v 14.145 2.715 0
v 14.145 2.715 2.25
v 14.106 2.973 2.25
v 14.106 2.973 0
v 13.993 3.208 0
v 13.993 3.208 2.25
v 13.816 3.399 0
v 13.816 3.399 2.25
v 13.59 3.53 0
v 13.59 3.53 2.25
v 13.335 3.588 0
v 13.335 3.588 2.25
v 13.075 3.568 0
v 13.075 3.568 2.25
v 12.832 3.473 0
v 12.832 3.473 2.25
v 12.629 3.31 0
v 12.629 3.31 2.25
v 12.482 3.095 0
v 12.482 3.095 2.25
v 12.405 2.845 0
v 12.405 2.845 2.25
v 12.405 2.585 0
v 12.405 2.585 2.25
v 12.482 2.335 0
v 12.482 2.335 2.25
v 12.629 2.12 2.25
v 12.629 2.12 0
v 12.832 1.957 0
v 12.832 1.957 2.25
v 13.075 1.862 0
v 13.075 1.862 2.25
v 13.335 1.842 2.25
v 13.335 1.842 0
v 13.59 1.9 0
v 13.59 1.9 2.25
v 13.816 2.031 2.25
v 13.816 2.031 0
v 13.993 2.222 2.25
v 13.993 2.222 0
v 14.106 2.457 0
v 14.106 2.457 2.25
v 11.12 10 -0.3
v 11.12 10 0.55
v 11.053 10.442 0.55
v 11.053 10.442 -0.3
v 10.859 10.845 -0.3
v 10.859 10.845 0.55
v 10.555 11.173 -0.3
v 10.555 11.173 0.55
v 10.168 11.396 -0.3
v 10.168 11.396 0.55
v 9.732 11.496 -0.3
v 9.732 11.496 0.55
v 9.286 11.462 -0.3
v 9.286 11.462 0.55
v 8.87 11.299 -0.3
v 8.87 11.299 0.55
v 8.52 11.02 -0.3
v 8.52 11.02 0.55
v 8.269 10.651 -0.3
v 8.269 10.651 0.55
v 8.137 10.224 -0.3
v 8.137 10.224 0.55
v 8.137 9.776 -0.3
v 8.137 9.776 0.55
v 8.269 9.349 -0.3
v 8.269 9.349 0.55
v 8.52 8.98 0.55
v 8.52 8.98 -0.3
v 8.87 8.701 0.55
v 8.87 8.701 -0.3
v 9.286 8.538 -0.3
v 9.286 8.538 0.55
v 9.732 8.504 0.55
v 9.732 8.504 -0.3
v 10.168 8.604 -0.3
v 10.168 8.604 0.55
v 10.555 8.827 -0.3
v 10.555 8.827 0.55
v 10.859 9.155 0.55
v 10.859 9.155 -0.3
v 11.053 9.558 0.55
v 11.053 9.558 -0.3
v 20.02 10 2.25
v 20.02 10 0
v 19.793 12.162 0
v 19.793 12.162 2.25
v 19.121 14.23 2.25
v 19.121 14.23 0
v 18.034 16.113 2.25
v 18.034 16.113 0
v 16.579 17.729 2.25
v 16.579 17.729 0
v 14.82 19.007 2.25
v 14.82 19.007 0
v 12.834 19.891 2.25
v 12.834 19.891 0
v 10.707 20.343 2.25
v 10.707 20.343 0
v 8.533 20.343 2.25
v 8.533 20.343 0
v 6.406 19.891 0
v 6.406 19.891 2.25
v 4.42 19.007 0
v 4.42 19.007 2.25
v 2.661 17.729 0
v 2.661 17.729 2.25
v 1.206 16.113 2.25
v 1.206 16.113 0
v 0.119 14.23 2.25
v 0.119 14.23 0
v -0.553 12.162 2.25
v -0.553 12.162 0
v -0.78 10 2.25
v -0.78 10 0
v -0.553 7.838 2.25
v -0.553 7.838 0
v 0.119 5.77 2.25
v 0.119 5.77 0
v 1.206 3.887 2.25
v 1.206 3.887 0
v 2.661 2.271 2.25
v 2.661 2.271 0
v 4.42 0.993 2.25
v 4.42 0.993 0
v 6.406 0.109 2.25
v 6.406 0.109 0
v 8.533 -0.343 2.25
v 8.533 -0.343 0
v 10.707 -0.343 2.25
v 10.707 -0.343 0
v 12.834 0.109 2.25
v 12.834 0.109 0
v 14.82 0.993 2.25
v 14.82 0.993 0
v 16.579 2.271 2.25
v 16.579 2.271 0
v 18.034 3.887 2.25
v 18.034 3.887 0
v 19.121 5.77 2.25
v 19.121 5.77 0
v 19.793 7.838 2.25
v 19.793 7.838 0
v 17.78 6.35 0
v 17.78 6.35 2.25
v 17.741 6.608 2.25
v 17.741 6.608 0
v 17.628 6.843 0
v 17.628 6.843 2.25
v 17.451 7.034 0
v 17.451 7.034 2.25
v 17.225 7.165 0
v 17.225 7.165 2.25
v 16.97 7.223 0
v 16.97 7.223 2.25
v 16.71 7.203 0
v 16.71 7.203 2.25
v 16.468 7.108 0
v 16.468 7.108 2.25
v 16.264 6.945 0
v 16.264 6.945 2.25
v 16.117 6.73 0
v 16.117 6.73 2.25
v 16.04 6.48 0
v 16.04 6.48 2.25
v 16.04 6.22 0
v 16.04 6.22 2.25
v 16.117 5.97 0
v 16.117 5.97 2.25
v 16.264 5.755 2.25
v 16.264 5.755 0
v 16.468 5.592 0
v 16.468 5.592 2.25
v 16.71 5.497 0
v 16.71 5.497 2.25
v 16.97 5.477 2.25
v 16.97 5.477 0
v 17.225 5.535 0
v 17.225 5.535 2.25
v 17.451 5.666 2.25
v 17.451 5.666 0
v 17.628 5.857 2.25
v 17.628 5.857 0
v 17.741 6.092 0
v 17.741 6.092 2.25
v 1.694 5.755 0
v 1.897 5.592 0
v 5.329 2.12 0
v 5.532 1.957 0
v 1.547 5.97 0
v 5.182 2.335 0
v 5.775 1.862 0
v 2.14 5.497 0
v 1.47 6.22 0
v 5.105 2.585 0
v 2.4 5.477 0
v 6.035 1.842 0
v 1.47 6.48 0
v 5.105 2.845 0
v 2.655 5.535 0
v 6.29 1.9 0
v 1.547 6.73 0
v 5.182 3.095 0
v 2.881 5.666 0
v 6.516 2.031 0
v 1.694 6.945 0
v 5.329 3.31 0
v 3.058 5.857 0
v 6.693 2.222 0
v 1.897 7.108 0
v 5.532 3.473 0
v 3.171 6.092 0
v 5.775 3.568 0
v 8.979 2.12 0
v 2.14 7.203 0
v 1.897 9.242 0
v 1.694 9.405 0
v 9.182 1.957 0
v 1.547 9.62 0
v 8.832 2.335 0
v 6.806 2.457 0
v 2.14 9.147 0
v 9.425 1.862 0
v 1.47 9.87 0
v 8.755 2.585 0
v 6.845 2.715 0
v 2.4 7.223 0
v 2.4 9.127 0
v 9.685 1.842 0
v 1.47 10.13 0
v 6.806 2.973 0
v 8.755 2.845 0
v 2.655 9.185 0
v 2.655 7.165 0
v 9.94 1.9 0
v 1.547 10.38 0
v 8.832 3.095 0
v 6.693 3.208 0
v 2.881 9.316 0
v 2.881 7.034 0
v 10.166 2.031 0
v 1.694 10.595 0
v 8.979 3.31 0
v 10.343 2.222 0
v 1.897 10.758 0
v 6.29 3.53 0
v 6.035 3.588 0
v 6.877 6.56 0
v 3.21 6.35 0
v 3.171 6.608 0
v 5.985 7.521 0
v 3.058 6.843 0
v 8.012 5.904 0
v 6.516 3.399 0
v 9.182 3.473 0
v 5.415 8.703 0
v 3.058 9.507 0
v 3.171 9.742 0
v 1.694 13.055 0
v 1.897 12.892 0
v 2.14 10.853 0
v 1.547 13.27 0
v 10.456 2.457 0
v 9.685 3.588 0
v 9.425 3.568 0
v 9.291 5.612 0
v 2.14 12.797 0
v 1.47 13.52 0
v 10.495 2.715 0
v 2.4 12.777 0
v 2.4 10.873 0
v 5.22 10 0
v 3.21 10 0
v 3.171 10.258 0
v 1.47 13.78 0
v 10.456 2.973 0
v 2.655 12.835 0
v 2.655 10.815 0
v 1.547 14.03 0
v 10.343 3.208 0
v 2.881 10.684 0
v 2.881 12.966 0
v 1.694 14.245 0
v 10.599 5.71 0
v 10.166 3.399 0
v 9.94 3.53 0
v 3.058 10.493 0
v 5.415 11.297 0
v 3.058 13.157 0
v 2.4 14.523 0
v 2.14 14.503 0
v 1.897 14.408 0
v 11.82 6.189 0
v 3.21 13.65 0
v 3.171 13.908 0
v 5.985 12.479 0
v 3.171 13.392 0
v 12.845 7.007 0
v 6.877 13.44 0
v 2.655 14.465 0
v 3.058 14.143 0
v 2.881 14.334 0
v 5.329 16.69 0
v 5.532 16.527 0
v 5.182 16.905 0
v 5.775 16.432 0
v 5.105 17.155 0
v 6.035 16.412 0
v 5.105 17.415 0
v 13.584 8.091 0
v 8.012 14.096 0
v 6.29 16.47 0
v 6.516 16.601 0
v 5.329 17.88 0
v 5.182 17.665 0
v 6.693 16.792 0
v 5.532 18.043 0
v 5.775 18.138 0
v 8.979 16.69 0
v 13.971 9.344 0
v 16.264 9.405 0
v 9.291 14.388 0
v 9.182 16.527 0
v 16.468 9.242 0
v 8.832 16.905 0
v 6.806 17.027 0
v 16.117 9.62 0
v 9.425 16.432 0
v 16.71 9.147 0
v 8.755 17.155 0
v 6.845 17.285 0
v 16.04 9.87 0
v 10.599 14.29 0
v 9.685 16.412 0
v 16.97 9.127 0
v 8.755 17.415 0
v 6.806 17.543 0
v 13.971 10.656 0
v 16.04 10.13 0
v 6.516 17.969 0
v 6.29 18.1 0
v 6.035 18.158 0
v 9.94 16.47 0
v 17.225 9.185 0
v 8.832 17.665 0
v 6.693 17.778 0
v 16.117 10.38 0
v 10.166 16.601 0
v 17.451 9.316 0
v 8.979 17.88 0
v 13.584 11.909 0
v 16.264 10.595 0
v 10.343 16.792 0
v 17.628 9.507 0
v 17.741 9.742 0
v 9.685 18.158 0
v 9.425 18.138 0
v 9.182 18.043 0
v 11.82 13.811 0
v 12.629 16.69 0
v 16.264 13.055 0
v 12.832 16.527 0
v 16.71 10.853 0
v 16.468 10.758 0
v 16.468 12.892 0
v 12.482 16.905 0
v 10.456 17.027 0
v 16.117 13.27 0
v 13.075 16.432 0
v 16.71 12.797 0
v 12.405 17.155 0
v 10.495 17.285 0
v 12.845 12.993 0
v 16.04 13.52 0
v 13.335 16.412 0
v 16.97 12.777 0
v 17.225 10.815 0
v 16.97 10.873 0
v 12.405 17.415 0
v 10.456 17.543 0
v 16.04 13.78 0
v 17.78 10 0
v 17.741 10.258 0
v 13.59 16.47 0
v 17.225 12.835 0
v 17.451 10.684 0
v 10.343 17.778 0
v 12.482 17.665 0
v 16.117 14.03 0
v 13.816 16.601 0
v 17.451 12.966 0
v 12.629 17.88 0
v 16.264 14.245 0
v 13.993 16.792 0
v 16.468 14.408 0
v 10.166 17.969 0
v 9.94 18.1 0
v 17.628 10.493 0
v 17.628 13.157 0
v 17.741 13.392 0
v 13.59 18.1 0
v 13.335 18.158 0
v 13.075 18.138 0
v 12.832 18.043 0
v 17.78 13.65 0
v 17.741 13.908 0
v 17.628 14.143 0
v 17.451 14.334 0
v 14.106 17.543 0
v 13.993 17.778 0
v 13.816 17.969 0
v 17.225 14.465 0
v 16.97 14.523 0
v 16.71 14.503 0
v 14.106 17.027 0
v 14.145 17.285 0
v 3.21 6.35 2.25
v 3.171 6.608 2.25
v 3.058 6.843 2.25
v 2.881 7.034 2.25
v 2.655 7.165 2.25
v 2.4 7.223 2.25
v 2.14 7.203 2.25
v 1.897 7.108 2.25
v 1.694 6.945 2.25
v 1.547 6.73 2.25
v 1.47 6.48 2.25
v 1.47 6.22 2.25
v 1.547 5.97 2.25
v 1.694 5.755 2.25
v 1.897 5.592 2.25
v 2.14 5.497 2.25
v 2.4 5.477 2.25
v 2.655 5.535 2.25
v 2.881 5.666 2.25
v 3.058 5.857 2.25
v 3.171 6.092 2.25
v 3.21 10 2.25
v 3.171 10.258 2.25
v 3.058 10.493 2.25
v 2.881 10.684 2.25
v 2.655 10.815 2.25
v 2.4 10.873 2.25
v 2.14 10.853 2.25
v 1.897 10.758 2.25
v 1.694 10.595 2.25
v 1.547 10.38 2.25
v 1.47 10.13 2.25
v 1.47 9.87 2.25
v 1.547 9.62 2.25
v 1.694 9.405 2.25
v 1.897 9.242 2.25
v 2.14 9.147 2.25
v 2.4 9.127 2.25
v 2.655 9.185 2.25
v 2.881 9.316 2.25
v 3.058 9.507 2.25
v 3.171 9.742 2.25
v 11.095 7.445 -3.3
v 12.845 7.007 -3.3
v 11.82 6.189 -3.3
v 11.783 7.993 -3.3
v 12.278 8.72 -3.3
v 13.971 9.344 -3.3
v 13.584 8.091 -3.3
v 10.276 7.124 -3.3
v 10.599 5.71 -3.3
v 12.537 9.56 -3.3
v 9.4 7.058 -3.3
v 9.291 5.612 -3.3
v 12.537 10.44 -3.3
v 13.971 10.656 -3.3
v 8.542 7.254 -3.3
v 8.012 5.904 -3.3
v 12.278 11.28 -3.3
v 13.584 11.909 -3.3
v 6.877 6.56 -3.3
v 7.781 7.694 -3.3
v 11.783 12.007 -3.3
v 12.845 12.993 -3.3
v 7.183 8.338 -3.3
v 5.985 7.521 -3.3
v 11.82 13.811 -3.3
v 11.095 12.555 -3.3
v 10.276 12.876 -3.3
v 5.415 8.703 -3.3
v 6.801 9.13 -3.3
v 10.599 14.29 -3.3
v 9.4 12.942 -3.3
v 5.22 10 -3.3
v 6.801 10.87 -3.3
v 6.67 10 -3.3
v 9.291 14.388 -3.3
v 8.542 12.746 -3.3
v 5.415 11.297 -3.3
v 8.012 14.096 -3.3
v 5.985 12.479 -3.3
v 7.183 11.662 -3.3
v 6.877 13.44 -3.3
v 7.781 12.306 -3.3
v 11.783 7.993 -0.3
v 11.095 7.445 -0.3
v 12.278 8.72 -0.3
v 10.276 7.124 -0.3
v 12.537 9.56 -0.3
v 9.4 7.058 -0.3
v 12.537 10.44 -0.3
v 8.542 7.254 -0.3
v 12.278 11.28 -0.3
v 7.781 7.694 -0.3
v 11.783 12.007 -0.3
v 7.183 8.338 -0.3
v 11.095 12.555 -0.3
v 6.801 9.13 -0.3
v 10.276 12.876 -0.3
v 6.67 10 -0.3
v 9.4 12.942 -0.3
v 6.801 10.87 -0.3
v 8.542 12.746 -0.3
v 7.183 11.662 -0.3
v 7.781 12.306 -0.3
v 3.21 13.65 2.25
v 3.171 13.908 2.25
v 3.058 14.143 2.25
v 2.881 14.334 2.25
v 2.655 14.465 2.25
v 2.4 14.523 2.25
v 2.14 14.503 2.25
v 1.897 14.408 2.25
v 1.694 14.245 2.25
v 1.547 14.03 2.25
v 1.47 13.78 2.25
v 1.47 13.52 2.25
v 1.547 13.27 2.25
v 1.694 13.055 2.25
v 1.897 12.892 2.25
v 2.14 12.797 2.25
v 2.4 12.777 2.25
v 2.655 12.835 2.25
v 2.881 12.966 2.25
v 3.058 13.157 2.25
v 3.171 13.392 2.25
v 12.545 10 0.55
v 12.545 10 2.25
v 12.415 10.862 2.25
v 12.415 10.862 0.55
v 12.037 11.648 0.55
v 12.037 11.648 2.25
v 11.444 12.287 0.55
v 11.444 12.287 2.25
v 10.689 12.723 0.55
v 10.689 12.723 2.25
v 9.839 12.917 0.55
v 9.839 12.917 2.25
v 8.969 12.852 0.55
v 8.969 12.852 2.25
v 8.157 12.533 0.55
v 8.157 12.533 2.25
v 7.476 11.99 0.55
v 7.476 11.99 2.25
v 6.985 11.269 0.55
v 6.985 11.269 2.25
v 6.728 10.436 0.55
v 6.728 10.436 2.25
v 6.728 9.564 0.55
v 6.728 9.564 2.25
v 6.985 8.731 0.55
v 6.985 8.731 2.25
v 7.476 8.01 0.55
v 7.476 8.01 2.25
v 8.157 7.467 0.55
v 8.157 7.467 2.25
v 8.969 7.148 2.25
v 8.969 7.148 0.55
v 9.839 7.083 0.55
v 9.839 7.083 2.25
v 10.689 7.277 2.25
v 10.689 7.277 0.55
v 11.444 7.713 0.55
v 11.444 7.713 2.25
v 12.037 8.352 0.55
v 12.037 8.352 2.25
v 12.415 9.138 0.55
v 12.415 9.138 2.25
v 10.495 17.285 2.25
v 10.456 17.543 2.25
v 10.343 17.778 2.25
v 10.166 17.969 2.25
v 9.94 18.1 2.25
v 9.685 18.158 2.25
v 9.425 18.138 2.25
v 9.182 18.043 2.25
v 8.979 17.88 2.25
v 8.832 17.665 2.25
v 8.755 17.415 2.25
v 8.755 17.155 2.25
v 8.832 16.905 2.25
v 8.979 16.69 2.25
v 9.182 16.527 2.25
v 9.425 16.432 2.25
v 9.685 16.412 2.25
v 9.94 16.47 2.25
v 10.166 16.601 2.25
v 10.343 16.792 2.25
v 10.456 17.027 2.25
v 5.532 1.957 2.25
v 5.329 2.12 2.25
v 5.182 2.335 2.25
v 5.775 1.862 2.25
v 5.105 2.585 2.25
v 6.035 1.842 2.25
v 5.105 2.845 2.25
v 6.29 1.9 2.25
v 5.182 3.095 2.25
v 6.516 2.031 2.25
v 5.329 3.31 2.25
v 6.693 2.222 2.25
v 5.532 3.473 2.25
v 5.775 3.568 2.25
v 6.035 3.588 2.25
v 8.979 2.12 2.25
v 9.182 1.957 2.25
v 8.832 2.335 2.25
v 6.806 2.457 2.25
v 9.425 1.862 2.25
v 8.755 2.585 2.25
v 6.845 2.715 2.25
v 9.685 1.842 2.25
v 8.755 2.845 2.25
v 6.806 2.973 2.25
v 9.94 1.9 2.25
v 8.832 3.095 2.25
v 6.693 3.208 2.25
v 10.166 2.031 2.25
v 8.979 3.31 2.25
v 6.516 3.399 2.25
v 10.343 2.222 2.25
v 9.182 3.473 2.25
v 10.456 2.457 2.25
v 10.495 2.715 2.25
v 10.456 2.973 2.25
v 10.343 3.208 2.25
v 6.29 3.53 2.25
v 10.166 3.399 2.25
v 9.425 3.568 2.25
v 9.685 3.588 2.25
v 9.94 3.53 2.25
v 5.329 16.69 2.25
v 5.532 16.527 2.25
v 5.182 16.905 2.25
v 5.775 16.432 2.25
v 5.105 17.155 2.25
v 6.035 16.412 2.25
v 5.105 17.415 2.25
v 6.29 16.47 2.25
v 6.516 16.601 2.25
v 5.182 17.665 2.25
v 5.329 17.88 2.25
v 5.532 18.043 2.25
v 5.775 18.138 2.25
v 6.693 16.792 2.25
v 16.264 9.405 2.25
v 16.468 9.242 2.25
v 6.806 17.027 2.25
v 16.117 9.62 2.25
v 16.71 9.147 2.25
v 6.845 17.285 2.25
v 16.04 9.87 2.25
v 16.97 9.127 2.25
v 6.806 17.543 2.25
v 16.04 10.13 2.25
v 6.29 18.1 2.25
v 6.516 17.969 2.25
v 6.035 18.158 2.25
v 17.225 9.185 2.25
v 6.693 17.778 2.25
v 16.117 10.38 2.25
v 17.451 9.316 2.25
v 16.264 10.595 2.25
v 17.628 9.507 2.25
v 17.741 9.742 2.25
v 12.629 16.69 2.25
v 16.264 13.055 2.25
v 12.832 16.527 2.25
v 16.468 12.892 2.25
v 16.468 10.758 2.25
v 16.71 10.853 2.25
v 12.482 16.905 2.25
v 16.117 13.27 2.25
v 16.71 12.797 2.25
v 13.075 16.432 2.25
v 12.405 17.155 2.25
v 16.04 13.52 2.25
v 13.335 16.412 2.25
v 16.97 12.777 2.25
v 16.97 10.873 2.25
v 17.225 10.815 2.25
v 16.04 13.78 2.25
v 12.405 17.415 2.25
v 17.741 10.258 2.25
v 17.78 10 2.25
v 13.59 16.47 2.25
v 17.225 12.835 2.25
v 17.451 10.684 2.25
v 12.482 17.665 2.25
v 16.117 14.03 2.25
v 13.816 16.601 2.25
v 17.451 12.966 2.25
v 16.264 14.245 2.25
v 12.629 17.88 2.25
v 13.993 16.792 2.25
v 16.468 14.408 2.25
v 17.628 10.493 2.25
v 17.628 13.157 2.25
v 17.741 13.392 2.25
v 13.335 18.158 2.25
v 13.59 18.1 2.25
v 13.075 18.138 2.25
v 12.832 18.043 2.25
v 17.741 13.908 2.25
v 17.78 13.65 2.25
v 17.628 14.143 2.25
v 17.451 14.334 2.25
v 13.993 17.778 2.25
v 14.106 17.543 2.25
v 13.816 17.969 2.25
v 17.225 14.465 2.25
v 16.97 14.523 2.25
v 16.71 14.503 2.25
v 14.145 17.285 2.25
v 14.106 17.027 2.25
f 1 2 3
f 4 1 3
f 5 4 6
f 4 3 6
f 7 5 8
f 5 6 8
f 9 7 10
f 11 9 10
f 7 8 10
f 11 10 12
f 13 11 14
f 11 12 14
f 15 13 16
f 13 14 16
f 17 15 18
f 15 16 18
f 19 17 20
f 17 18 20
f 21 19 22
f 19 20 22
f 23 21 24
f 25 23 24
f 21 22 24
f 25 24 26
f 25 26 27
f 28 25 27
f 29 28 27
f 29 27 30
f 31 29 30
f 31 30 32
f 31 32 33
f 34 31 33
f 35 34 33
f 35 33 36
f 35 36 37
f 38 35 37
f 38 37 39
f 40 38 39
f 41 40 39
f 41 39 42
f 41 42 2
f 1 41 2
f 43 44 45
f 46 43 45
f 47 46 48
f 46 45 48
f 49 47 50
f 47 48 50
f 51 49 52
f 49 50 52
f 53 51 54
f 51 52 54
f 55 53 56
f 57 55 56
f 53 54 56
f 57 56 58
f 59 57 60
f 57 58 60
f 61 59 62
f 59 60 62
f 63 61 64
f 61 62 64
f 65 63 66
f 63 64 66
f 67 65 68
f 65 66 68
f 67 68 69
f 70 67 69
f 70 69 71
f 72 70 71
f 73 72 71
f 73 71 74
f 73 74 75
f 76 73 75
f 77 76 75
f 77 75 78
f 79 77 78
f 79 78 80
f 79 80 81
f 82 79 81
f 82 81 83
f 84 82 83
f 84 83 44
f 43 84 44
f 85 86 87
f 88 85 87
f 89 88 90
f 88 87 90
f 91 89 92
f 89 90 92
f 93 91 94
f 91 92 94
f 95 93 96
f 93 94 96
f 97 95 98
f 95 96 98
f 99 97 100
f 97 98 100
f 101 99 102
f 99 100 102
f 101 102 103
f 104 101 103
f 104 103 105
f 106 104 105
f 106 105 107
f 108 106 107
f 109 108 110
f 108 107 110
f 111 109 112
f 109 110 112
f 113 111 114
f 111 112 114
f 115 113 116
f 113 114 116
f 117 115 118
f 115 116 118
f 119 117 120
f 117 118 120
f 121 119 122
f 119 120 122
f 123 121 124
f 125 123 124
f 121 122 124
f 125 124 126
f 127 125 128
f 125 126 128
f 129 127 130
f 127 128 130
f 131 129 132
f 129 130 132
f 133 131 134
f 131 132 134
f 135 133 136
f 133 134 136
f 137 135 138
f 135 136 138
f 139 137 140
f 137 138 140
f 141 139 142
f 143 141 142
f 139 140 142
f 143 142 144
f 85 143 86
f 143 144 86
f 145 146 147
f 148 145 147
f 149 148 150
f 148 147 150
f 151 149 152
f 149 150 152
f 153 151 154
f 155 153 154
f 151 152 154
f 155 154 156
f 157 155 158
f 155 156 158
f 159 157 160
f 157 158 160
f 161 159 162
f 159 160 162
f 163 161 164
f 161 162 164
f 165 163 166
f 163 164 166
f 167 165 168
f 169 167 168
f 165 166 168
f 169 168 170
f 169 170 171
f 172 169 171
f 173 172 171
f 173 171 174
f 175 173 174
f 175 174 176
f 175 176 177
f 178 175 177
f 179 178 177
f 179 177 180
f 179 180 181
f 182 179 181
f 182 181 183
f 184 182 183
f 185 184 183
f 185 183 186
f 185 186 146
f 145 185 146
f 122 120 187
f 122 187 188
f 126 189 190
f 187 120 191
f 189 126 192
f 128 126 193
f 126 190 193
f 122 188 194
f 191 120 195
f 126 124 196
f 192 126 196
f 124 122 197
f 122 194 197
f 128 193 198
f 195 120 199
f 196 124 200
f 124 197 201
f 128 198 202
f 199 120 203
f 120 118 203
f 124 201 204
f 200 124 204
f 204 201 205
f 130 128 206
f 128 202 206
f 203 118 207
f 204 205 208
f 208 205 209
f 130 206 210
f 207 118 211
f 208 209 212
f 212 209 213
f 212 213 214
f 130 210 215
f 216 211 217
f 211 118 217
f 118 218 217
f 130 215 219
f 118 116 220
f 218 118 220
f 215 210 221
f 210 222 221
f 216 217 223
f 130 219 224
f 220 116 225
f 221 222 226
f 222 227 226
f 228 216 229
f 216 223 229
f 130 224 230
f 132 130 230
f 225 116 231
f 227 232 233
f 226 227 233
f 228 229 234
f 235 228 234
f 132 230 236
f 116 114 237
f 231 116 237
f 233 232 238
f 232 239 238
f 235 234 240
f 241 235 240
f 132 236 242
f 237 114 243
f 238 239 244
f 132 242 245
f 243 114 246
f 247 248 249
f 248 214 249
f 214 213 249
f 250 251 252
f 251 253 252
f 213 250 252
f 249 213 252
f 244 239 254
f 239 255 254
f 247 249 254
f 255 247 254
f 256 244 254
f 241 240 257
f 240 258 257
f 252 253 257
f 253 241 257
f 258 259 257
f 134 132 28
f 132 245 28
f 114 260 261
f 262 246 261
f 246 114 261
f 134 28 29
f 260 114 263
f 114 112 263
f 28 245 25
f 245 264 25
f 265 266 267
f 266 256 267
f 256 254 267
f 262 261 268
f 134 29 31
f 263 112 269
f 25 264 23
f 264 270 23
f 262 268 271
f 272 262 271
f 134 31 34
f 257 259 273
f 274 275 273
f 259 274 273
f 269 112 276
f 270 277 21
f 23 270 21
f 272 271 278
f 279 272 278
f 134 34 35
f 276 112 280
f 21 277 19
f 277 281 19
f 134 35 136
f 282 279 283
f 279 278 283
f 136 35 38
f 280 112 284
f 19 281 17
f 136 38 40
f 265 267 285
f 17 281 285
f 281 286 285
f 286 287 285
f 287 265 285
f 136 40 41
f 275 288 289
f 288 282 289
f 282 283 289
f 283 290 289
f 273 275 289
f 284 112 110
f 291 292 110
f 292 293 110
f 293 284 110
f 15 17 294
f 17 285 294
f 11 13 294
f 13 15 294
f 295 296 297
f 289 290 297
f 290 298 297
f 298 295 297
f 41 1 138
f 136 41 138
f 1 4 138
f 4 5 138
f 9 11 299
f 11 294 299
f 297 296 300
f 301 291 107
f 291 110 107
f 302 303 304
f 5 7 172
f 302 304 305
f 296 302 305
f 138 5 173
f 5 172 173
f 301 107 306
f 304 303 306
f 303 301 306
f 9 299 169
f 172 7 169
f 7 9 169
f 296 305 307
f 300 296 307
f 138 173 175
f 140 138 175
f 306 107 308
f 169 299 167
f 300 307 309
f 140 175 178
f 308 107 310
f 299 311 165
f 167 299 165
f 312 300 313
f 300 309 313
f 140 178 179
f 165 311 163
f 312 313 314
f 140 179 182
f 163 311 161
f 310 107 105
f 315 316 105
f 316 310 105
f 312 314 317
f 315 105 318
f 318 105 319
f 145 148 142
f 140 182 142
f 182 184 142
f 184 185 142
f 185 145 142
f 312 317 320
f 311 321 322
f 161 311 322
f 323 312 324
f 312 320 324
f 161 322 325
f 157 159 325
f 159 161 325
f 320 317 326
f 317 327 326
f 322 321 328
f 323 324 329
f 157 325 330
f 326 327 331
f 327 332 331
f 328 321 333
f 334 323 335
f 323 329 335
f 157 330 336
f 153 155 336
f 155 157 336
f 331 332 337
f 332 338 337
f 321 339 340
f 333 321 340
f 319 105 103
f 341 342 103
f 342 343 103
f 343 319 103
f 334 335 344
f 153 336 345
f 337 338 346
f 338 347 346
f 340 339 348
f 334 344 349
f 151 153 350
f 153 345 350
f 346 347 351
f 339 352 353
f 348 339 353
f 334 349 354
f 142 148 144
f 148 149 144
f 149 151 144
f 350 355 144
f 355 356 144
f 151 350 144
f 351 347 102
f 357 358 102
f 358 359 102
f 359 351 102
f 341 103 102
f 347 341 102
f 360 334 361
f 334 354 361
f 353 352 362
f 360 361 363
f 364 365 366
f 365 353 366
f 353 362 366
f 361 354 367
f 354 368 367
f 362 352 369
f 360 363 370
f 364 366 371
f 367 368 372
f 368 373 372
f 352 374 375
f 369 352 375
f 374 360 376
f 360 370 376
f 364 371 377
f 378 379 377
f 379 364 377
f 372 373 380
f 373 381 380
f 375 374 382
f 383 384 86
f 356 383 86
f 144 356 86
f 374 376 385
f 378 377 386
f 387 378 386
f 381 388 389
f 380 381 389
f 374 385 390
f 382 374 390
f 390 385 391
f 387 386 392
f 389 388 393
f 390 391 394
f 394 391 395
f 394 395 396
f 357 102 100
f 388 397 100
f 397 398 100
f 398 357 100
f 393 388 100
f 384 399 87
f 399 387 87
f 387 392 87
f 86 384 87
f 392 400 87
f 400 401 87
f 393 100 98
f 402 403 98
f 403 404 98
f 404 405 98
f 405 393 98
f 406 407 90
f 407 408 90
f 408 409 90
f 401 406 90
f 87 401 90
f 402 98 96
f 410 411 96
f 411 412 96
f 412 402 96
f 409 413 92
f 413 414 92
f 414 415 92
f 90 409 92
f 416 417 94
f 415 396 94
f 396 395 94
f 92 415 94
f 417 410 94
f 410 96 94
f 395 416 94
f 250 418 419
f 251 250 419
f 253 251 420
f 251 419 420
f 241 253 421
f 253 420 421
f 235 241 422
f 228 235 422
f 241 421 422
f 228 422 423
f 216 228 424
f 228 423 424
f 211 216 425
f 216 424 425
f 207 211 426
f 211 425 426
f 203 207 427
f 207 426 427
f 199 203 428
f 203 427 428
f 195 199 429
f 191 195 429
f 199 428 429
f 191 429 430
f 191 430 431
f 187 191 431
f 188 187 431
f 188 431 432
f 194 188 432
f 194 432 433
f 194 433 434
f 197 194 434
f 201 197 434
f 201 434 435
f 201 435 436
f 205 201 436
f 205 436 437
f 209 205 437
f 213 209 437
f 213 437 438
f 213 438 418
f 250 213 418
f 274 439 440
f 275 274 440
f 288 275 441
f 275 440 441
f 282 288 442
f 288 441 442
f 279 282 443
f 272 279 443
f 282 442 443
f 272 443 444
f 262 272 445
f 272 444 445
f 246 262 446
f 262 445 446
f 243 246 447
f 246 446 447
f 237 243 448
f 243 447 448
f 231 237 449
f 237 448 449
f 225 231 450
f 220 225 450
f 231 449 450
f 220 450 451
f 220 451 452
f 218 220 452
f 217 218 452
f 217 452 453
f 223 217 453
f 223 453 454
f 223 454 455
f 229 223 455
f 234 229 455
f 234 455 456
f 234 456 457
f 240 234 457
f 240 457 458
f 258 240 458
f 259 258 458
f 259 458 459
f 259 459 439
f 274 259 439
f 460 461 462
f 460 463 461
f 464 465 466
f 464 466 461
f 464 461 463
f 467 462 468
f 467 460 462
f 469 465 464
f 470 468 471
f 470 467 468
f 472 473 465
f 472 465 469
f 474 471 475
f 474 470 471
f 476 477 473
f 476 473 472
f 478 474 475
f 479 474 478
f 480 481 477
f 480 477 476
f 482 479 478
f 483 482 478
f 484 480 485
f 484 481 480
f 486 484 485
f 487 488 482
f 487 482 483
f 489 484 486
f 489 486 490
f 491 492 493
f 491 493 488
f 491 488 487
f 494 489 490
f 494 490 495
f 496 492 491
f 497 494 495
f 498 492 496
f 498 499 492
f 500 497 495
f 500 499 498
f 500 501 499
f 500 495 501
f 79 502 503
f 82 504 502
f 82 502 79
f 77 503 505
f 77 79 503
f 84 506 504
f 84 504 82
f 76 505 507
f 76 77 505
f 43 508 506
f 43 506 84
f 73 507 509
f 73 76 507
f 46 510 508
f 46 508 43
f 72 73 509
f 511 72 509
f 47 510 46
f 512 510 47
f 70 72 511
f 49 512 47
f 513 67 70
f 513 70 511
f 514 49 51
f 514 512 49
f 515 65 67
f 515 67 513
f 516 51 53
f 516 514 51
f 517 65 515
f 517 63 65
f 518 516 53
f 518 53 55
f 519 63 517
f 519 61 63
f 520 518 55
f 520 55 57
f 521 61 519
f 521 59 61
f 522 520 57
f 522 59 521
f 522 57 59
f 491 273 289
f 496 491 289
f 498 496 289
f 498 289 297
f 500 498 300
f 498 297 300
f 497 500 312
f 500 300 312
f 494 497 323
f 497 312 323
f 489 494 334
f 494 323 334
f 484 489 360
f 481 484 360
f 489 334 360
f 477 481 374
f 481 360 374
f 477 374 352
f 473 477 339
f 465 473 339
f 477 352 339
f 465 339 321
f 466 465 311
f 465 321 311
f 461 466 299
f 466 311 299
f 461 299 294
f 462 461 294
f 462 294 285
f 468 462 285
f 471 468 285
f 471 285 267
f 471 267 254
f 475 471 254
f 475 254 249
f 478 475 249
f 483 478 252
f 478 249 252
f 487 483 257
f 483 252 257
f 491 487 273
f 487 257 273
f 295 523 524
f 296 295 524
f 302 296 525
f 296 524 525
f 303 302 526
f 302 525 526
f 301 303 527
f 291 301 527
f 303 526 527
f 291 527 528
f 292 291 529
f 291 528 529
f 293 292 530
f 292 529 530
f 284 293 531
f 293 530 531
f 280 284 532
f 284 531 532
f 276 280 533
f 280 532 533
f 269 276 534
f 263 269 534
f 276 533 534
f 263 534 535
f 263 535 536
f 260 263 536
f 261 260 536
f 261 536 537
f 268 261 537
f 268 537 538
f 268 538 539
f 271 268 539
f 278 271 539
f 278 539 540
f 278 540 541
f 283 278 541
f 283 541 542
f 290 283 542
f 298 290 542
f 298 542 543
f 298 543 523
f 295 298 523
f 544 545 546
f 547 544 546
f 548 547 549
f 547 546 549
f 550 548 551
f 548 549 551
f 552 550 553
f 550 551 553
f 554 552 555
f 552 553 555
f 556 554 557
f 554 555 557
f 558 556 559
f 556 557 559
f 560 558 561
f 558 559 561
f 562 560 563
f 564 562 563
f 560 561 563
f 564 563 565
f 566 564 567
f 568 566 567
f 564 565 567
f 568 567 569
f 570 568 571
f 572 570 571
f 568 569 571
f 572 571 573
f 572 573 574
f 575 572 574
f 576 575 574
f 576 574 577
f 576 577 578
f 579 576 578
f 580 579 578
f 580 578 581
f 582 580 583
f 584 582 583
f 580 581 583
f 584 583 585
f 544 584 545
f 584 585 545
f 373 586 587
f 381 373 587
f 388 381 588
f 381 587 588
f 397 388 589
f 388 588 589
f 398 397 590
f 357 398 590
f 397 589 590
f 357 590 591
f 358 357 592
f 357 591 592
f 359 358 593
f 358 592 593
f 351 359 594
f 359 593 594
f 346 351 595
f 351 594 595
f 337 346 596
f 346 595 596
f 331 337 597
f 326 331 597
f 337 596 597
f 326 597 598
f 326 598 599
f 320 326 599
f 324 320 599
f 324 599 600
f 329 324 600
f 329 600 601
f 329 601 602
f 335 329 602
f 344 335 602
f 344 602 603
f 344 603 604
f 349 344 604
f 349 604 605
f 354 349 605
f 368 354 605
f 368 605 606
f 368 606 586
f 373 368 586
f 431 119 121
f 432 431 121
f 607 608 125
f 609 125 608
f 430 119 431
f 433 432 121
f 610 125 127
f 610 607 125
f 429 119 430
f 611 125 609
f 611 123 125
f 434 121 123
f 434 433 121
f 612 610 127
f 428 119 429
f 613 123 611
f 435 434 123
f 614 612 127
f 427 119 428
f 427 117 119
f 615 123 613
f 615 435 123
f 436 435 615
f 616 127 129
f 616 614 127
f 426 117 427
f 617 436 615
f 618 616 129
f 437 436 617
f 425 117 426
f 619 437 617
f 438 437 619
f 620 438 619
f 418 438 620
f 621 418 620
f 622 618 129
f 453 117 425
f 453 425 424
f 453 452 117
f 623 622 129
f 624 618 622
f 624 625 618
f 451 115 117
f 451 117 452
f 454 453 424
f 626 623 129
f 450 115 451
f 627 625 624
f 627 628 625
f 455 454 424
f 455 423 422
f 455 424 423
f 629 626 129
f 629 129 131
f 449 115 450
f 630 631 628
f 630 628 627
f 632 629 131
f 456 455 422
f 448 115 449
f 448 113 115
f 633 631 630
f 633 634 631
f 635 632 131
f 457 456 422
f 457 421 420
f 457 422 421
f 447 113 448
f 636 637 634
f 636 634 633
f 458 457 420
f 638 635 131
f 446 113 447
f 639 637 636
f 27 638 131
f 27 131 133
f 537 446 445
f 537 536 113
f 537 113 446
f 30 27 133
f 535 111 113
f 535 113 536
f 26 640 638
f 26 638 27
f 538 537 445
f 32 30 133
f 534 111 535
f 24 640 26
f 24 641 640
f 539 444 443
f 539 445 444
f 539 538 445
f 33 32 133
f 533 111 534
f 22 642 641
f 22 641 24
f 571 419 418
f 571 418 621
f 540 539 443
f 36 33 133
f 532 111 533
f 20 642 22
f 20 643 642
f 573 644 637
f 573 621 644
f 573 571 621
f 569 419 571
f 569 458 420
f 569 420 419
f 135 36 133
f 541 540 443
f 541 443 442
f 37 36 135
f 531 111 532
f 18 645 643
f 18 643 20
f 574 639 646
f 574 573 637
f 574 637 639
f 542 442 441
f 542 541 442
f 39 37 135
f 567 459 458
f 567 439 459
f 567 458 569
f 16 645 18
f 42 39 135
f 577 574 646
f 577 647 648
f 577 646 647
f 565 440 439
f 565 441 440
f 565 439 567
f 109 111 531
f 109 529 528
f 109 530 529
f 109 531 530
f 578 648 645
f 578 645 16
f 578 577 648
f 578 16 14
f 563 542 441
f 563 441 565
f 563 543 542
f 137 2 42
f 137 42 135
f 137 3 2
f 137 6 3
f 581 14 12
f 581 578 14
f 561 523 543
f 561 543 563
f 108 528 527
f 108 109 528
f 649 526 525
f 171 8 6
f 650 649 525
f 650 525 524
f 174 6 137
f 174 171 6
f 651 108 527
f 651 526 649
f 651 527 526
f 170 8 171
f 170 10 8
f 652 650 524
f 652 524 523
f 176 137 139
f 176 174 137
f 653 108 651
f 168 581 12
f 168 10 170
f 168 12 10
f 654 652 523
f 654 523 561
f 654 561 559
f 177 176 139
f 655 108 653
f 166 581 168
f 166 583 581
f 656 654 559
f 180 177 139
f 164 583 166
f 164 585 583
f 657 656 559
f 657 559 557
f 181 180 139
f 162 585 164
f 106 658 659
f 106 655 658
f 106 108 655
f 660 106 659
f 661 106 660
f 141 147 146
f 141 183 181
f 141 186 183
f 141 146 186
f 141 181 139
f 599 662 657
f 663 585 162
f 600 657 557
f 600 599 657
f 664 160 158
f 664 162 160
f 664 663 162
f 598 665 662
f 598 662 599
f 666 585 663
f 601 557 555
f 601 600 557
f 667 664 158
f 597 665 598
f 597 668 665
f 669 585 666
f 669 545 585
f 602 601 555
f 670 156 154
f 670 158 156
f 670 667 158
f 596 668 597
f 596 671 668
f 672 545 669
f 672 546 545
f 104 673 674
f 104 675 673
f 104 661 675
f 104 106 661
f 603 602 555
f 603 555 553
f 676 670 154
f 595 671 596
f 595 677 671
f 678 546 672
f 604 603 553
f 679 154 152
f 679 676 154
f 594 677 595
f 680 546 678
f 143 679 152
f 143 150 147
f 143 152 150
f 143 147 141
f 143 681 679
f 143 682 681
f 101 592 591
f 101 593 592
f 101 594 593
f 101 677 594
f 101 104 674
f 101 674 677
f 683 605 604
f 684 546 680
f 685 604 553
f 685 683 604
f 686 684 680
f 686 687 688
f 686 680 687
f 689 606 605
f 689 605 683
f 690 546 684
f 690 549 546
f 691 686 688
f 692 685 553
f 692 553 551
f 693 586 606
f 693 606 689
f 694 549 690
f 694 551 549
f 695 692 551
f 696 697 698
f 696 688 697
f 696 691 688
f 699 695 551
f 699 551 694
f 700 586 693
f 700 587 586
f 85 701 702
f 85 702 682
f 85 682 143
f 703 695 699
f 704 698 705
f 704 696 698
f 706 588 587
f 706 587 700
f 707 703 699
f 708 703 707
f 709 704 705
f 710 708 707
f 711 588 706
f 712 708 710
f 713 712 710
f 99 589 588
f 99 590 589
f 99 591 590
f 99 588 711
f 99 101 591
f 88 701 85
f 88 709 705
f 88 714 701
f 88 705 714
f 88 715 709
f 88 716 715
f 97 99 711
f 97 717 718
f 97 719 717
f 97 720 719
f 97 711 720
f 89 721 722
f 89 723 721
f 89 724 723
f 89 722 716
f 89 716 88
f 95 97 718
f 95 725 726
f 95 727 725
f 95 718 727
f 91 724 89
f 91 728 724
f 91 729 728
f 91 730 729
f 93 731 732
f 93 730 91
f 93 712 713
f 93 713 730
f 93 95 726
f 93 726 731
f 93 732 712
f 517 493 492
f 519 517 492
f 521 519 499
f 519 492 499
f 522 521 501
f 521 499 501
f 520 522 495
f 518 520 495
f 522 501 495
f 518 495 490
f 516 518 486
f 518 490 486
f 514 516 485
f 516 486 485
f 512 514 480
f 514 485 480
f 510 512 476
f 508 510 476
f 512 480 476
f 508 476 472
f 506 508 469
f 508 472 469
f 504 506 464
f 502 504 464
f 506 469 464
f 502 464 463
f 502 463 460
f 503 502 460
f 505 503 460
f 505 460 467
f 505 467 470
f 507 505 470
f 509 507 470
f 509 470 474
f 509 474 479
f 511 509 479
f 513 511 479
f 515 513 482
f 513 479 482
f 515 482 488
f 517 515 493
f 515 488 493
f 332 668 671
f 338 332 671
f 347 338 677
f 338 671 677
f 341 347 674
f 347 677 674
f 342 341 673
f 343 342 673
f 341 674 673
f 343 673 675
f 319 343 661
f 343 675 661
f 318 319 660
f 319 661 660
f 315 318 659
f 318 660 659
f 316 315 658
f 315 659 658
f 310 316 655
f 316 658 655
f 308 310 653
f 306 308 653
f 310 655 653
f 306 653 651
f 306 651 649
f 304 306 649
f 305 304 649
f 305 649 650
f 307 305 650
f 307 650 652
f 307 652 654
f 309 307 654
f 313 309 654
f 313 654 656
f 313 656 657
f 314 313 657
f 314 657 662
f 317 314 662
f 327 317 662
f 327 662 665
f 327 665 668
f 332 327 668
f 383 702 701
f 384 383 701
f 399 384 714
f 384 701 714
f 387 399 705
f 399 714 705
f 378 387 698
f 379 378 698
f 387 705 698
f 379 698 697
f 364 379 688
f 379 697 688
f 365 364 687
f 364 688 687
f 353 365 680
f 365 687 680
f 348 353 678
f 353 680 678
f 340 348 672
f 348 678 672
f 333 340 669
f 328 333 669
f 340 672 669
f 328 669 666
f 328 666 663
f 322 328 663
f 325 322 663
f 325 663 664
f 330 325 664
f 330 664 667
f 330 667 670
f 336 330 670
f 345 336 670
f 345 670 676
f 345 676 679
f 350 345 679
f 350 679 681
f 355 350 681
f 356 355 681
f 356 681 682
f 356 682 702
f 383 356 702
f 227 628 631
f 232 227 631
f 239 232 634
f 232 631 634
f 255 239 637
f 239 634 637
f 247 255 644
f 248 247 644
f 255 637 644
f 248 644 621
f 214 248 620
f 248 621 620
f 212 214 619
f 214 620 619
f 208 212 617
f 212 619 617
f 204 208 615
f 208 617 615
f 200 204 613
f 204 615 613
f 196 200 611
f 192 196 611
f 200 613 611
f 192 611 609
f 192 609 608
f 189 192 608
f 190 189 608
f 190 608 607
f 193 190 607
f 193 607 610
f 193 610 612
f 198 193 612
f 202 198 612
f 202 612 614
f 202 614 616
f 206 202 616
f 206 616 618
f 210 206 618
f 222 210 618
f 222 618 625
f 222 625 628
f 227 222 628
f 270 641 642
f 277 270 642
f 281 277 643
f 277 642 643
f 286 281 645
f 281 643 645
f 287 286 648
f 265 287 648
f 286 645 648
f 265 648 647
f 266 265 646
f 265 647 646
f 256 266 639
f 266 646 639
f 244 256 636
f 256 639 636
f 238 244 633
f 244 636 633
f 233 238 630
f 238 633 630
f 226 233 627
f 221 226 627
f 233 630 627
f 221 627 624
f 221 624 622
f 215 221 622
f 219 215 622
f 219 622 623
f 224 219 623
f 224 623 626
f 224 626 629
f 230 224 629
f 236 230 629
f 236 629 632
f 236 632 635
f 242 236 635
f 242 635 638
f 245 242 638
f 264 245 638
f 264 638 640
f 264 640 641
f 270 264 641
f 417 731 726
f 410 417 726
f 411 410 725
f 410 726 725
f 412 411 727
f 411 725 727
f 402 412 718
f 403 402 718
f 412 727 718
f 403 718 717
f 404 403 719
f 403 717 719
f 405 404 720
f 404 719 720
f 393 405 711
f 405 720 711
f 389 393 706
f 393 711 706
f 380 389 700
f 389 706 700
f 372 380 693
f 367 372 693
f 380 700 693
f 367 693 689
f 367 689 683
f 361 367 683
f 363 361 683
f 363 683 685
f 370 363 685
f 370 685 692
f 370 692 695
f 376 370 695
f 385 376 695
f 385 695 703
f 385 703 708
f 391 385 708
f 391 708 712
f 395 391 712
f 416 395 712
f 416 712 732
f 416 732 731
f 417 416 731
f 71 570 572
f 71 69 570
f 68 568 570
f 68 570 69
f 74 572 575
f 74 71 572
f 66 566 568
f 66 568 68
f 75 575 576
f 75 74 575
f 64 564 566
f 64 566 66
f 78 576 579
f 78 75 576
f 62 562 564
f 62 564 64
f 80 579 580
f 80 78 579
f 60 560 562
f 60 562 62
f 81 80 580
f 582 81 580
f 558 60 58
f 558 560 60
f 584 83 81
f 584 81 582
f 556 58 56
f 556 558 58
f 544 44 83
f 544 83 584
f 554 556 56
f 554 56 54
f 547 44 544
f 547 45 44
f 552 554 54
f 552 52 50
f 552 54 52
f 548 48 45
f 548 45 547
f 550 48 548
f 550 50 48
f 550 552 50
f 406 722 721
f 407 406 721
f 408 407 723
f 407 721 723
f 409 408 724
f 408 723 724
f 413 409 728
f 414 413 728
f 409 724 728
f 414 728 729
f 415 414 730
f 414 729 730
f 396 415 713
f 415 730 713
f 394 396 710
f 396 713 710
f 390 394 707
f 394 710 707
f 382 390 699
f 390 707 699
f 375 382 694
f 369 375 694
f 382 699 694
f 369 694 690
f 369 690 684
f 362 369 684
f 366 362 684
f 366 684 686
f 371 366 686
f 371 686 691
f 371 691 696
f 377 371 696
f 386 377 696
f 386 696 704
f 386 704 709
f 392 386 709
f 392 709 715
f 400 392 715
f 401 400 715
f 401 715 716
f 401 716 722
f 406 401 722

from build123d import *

# Parameters (mm, degrees)
SKETCH1_R           = 10.4
BOSS_EXTRUDE1_DEPTH = 2.25
SKETCH2_R           = 4.4
BOSS_EXTRUDE2_DEPTH = 3.3
SKETCH3_R           = 1.5
SKETCH3_R_2         = 0.875
CUT_EXTRUDE1_DEPTH  = 5.55
SKETCH4_R           = 2.925
CUT_EXTRUDE2_DEPTH  = 1.7
SKETCH5_R           = 2.95
CUT_EXTRUDE3_DEPTH  = 3


with BuildPart() as part:
    # Sketch1 → Boss-Extrude1 (new body)
    with BuildSketch(Plane.XY):
        with Locations((9.62, 10)):
            Circle(SKETCH1_R)
    extrude(amount=BOSS_EXTRUDE1_DEPTH)

    # Sketch2 → Boss-Extrude2 (add)
    with BuildSketch(Plane(origin=(0, 0, 0), x_dir=(-1, 0, 0), z_dir=(0, 0, -1))):
        with Locations((-9.62, 10)):
            Circle(SKETCH2_R)
    extrude(amount=BOSS_EXTRUDE2_DEPTH)

    # Sketch3 → Cut-Extrude1 (cut)
    with BuildSketch(Plane.XY.offset(2.25)):
        with Locations((9.62, 10)):
            Circle(SKETCH3_R)
        with Locations((9.62, 2.715)):
            Circle(SKETCH3_R_2)
        with Locations((5.97, 2.715)):
            Circle(SKETCH3_R_2)
        with Locations((13.27, 2.715)):
            Circle(SKETCH3_R_2)
        with Locations((2.335, 6.35)):
            Circle(SKETCH3_R_2)
        with Locations((2.335, 10)):
            Circle(SKETCH3_R_2)
        with Locations((2.335, 13.65)):
            Circle(SKETCH3_R_2)
        with Locations((5.97, 17.285)):
            Circle(SKETCH3_R_2)
        with Locations((9.62, 17.285)):
            Circle(SKETCH3_R_2)
        with Locations((13.27, 17.285)):
            Circle(SKETCH3_R_2)
        with Locations((16.905, 13.65)):
            Circle(SKETCH3_R_2)
        with Locations((16.905, 10)):
            Circle(SKETCH3_R_2)
        with Locations((16.905, 6.35)):
            Circle(SKETCH3_R_2)
    extrude(amount=-CUT_EXTRUDE1_DEPTH, mode=Mode.SUBTRACT)

    # Sketch4 → Cut-Extrude2 (cut)
    with BuildSketch(Plane.XY.offset(2.25)):
        with Locations((9.62, 10)):
            Circle(SKETCH4_R)
    extrude(amount=-CUT_EXTRUDE2_DEPTH, mode=Mode.SUBTRACT)

    # Sketch5 → Cut-Extrude3 (cut)
    with BuildSketch(Plane(origin=(0, 0, -3.3), x_dir=(-1, 0, 0), z_dir=(0, 0, -1))):
        with Locations((-9.62, 10)):
            Circle(SKETCH5_R)
    extrude(amount=-CUT_EXTRUDE3_DEPTH, mode=Mode.SUBTRACT)


solid = part.part
